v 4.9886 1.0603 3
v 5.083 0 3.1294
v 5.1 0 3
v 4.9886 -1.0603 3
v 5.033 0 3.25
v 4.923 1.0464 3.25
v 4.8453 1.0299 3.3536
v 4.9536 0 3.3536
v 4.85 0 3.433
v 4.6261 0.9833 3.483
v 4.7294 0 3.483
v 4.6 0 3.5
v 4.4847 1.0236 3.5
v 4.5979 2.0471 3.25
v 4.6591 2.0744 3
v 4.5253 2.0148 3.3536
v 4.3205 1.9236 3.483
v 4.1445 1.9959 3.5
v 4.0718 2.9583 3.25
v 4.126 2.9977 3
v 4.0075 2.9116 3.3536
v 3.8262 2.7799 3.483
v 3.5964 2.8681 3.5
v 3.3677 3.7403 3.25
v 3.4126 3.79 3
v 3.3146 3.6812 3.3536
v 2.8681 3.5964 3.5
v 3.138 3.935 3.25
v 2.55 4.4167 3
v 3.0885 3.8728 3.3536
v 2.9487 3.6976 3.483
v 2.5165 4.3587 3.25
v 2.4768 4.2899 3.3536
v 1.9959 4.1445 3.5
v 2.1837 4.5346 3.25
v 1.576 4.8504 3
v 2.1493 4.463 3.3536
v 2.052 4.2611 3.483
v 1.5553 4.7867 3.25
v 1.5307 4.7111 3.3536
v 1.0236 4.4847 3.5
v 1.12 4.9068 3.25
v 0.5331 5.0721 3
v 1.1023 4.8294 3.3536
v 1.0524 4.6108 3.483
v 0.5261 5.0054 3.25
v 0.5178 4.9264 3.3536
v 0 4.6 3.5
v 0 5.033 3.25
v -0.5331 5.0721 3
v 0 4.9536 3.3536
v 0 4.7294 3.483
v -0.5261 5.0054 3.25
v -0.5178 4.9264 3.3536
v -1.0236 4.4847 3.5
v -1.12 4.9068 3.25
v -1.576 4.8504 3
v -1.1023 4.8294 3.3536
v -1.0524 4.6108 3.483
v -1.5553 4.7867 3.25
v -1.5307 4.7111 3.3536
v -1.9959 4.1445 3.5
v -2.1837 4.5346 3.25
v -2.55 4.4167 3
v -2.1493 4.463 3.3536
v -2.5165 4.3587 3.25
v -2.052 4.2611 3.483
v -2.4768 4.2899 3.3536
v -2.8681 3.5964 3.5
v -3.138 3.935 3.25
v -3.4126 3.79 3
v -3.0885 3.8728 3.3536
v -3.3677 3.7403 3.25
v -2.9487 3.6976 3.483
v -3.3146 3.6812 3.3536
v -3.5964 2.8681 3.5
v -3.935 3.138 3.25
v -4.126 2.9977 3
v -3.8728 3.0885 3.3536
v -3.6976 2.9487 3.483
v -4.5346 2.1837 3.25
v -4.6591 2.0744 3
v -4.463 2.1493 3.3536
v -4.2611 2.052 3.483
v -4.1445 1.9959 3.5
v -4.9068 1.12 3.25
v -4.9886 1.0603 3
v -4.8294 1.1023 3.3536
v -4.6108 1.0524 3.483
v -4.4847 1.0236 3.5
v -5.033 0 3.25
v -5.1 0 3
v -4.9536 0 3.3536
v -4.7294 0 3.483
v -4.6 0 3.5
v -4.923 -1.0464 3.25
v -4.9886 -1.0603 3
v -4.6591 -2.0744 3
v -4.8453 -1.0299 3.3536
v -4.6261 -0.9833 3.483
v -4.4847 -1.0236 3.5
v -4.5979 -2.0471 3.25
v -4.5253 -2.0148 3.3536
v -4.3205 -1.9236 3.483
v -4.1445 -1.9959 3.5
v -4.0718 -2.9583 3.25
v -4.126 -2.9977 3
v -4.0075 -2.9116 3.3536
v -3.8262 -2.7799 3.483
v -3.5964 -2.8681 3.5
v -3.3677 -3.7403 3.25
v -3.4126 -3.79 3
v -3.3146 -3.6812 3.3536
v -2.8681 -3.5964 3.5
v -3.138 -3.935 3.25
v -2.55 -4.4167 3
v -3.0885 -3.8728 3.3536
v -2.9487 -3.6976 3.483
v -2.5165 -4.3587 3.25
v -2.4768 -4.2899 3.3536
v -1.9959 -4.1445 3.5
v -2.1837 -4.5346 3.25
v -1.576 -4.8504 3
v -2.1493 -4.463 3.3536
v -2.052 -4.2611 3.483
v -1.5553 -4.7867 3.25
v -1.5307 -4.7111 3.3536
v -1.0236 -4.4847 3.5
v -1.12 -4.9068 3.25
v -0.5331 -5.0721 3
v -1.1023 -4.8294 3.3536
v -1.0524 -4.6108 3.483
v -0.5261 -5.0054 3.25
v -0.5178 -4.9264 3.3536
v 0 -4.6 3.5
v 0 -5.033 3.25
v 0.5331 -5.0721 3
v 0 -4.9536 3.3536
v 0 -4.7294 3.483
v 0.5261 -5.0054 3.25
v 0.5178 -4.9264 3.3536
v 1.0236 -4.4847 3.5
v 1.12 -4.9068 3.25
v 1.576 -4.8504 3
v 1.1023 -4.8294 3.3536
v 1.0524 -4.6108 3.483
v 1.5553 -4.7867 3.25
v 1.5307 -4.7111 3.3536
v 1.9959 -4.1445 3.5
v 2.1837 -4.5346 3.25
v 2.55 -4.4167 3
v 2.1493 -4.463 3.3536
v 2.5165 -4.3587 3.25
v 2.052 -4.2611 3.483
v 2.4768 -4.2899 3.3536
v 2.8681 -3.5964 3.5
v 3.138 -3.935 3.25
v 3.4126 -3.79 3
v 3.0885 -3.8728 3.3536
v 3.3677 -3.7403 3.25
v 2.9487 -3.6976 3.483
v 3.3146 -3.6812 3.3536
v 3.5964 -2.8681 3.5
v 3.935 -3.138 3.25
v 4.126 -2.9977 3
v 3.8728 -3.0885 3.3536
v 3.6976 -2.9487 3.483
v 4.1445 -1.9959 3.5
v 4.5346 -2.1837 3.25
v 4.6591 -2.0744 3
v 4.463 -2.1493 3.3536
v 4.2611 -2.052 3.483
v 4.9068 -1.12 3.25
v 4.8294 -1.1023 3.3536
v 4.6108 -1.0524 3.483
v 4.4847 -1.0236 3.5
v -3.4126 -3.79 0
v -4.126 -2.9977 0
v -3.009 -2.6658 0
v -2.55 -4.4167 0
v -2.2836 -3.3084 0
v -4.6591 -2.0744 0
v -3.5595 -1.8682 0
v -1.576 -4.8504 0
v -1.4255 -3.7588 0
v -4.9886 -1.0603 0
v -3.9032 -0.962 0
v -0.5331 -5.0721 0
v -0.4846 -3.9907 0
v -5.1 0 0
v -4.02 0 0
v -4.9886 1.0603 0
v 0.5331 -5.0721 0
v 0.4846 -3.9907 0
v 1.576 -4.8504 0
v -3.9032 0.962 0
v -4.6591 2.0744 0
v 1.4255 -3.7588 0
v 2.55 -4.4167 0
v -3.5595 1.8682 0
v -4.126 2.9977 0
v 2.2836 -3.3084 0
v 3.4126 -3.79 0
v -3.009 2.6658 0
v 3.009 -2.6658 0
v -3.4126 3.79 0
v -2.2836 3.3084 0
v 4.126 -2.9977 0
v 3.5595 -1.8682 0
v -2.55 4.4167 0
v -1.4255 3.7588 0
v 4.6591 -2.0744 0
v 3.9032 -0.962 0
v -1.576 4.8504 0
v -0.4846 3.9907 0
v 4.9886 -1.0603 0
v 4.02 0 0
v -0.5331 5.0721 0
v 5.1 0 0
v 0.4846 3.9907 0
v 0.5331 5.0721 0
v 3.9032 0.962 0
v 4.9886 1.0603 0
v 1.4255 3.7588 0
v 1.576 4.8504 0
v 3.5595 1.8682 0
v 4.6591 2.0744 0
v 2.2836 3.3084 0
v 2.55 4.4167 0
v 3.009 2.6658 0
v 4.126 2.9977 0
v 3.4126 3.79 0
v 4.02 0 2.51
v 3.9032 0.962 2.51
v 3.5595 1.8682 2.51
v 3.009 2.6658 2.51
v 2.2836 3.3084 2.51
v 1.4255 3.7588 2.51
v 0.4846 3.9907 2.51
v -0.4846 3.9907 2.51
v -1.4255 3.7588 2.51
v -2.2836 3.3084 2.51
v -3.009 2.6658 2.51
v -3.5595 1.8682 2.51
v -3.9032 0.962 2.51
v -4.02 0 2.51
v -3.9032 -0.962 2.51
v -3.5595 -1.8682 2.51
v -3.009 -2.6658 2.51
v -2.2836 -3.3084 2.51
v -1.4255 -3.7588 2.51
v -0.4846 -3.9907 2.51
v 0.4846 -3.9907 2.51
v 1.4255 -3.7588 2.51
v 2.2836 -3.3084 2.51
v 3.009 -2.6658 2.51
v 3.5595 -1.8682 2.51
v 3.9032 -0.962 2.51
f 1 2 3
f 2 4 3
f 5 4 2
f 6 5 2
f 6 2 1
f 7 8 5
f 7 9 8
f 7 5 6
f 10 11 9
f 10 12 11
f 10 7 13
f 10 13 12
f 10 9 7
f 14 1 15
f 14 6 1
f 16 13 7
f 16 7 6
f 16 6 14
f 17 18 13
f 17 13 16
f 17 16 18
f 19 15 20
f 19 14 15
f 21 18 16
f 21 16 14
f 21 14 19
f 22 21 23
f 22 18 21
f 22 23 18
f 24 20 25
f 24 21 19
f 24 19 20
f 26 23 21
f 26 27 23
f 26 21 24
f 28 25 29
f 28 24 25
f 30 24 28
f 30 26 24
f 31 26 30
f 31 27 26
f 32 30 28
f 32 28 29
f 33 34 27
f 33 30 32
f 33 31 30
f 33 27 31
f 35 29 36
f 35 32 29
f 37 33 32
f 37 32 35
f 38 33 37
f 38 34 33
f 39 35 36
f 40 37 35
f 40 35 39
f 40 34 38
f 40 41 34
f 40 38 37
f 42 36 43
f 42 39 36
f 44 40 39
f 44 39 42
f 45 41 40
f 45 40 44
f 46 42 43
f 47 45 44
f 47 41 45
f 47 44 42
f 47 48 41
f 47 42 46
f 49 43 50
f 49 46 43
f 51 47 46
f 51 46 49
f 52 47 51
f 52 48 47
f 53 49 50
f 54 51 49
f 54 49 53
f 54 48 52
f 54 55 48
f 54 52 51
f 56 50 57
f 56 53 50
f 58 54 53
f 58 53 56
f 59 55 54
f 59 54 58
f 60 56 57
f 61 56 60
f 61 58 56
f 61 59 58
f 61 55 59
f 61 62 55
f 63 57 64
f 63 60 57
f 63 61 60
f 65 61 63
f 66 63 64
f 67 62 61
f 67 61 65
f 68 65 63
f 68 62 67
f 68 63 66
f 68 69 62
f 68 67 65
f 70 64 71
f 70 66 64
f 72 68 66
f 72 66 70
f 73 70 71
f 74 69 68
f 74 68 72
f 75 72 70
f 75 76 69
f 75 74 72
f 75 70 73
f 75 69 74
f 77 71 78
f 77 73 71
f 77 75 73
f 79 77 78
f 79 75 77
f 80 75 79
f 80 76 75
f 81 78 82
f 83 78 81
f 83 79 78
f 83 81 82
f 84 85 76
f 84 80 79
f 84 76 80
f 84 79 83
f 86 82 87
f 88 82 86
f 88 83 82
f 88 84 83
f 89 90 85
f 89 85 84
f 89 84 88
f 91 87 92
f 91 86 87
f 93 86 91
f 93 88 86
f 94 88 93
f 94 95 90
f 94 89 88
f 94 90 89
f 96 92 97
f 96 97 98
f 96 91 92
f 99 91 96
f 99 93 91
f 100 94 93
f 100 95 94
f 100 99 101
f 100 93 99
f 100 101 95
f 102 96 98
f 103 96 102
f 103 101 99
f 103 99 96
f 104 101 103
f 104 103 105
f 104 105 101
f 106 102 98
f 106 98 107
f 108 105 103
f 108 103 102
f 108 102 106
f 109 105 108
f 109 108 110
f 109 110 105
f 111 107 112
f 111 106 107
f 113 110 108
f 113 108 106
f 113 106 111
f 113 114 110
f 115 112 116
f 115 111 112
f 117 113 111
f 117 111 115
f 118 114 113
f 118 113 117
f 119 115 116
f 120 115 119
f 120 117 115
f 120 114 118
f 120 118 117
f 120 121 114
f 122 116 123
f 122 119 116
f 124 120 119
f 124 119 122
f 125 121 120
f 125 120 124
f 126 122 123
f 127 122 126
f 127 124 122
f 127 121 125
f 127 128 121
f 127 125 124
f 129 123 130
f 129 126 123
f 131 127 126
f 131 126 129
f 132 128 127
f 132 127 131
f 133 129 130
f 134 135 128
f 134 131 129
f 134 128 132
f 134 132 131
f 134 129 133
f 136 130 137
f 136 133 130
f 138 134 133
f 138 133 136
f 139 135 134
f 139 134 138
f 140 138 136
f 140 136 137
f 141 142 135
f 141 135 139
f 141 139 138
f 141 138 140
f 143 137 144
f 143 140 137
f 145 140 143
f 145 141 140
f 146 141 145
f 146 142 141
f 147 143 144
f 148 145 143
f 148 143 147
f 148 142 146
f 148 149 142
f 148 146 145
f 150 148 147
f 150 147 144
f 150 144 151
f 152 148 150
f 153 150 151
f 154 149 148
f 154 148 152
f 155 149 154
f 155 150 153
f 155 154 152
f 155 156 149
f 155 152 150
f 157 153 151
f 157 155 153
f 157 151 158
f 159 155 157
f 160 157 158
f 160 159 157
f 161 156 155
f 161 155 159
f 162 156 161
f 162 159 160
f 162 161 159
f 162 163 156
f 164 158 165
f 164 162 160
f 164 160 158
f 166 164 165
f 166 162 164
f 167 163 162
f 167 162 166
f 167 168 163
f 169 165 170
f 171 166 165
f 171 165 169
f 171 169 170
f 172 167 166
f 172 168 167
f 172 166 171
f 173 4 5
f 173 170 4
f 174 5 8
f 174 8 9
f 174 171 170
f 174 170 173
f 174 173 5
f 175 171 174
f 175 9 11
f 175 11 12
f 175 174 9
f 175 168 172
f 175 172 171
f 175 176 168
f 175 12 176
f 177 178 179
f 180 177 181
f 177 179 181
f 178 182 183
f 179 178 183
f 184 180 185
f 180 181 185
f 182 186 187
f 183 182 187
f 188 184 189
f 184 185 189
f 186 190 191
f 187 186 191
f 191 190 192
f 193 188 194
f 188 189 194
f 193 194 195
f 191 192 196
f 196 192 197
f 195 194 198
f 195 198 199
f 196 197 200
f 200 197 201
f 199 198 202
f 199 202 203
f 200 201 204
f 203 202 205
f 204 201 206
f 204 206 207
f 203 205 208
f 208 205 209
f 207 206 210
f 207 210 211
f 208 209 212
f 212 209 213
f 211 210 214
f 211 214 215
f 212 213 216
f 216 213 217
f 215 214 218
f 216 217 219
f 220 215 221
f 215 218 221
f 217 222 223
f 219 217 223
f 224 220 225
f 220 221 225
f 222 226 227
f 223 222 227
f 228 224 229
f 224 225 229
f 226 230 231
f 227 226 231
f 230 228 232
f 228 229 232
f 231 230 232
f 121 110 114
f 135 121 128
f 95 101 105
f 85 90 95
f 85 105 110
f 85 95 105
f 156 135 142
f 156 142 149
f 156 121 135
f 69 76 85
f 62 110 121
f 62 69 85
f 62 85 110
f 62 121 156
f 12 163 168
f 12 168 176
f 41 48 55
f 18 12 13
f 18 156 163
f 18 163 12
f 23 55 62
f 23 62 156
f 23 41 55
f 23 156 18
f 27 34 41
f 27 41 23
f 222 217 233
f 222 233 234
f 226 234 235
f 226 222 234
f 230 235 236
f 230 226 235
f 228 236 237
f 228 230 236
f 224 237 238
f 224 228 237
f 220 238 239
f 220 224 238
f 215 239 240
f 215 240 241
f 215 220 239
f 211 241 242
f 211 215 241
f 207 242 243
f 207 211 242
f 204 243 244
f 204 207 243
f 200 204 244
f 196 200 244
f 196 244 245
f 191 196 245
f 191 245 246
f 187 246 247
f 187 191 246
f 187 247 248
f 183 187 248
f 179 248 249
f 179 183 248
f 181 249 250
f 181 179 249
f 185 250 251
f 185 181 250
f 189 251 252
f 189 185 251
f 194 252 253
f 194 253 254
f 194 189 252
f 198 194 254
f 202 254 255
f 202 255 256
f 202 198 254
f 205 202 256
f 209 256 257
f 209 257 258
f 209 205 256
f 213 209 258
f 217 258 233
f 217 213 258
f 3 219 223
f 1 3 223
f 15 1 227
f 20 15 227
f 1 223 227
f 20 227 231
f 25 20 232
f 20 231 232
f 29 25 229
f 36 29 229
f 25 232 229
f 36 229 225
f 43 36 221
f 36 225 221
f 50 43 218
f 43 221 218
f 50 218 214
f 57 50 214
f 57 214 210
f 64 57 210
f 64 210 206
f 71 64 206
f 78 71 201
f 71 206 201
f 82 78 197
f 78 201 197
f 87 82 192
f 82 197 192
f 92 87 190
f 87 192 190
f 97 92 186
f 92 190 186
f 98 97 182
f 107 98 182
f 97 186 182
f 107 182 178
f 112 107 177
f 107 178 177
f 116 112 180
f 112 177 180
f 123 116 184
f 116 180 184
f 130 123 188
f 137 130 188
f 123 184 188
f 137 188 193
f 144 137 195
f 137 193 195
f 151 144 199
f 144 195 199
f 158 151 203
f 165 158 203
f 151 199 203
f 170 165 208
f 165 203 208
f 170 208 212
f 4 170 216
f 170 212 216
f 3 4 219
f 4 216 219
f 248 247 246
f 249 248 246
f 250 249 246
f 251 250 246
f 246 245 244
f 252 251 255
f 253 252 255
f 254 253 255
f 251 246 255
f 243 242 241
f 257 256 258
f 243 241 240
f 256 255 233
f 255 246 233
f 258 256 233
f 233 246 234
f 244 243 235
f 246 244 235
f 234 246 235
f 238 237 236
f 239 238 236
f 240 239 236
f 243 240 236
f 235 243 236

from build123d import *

# Parameters (mm, degrees)
CYLINDER001_R     = 4.02
CYLINDER001_DEPTH = 2.51
CYLINDER_R        = 5.1
CYLINDER_DEPTH    = 3.5
FILLET_R          = 0.5


with BuildPart() as cylinder001:
    # Cylinder001 → Cylinder001 (new body)
    with BuildSketch(Plane.XY):
        Circle(CYLINDER001_R)
    extrude(amount=CYLINDER001_DEPTH)


with BuildPart() as fillet_body:
    # Cylinder → Cylinder (new body)
    with BuildSketch(Plane.XY):
        Circle(CYLINDER_R)
    extrude(amount=CYLINDER_DEPTH)

    # Cut: cut Cylinder001
    add(cylinder001.part, mode=Mode.SUBTRACT)

    # Fillet
    fillet_edges = [fillet_body.edges().sort_by_distance(p)[0] for p in [
        (-5.1, 0, 3.5),
    ]]
    fillet(fillet_edges, radius=FILLET_R)


solid = fillet_body.part
